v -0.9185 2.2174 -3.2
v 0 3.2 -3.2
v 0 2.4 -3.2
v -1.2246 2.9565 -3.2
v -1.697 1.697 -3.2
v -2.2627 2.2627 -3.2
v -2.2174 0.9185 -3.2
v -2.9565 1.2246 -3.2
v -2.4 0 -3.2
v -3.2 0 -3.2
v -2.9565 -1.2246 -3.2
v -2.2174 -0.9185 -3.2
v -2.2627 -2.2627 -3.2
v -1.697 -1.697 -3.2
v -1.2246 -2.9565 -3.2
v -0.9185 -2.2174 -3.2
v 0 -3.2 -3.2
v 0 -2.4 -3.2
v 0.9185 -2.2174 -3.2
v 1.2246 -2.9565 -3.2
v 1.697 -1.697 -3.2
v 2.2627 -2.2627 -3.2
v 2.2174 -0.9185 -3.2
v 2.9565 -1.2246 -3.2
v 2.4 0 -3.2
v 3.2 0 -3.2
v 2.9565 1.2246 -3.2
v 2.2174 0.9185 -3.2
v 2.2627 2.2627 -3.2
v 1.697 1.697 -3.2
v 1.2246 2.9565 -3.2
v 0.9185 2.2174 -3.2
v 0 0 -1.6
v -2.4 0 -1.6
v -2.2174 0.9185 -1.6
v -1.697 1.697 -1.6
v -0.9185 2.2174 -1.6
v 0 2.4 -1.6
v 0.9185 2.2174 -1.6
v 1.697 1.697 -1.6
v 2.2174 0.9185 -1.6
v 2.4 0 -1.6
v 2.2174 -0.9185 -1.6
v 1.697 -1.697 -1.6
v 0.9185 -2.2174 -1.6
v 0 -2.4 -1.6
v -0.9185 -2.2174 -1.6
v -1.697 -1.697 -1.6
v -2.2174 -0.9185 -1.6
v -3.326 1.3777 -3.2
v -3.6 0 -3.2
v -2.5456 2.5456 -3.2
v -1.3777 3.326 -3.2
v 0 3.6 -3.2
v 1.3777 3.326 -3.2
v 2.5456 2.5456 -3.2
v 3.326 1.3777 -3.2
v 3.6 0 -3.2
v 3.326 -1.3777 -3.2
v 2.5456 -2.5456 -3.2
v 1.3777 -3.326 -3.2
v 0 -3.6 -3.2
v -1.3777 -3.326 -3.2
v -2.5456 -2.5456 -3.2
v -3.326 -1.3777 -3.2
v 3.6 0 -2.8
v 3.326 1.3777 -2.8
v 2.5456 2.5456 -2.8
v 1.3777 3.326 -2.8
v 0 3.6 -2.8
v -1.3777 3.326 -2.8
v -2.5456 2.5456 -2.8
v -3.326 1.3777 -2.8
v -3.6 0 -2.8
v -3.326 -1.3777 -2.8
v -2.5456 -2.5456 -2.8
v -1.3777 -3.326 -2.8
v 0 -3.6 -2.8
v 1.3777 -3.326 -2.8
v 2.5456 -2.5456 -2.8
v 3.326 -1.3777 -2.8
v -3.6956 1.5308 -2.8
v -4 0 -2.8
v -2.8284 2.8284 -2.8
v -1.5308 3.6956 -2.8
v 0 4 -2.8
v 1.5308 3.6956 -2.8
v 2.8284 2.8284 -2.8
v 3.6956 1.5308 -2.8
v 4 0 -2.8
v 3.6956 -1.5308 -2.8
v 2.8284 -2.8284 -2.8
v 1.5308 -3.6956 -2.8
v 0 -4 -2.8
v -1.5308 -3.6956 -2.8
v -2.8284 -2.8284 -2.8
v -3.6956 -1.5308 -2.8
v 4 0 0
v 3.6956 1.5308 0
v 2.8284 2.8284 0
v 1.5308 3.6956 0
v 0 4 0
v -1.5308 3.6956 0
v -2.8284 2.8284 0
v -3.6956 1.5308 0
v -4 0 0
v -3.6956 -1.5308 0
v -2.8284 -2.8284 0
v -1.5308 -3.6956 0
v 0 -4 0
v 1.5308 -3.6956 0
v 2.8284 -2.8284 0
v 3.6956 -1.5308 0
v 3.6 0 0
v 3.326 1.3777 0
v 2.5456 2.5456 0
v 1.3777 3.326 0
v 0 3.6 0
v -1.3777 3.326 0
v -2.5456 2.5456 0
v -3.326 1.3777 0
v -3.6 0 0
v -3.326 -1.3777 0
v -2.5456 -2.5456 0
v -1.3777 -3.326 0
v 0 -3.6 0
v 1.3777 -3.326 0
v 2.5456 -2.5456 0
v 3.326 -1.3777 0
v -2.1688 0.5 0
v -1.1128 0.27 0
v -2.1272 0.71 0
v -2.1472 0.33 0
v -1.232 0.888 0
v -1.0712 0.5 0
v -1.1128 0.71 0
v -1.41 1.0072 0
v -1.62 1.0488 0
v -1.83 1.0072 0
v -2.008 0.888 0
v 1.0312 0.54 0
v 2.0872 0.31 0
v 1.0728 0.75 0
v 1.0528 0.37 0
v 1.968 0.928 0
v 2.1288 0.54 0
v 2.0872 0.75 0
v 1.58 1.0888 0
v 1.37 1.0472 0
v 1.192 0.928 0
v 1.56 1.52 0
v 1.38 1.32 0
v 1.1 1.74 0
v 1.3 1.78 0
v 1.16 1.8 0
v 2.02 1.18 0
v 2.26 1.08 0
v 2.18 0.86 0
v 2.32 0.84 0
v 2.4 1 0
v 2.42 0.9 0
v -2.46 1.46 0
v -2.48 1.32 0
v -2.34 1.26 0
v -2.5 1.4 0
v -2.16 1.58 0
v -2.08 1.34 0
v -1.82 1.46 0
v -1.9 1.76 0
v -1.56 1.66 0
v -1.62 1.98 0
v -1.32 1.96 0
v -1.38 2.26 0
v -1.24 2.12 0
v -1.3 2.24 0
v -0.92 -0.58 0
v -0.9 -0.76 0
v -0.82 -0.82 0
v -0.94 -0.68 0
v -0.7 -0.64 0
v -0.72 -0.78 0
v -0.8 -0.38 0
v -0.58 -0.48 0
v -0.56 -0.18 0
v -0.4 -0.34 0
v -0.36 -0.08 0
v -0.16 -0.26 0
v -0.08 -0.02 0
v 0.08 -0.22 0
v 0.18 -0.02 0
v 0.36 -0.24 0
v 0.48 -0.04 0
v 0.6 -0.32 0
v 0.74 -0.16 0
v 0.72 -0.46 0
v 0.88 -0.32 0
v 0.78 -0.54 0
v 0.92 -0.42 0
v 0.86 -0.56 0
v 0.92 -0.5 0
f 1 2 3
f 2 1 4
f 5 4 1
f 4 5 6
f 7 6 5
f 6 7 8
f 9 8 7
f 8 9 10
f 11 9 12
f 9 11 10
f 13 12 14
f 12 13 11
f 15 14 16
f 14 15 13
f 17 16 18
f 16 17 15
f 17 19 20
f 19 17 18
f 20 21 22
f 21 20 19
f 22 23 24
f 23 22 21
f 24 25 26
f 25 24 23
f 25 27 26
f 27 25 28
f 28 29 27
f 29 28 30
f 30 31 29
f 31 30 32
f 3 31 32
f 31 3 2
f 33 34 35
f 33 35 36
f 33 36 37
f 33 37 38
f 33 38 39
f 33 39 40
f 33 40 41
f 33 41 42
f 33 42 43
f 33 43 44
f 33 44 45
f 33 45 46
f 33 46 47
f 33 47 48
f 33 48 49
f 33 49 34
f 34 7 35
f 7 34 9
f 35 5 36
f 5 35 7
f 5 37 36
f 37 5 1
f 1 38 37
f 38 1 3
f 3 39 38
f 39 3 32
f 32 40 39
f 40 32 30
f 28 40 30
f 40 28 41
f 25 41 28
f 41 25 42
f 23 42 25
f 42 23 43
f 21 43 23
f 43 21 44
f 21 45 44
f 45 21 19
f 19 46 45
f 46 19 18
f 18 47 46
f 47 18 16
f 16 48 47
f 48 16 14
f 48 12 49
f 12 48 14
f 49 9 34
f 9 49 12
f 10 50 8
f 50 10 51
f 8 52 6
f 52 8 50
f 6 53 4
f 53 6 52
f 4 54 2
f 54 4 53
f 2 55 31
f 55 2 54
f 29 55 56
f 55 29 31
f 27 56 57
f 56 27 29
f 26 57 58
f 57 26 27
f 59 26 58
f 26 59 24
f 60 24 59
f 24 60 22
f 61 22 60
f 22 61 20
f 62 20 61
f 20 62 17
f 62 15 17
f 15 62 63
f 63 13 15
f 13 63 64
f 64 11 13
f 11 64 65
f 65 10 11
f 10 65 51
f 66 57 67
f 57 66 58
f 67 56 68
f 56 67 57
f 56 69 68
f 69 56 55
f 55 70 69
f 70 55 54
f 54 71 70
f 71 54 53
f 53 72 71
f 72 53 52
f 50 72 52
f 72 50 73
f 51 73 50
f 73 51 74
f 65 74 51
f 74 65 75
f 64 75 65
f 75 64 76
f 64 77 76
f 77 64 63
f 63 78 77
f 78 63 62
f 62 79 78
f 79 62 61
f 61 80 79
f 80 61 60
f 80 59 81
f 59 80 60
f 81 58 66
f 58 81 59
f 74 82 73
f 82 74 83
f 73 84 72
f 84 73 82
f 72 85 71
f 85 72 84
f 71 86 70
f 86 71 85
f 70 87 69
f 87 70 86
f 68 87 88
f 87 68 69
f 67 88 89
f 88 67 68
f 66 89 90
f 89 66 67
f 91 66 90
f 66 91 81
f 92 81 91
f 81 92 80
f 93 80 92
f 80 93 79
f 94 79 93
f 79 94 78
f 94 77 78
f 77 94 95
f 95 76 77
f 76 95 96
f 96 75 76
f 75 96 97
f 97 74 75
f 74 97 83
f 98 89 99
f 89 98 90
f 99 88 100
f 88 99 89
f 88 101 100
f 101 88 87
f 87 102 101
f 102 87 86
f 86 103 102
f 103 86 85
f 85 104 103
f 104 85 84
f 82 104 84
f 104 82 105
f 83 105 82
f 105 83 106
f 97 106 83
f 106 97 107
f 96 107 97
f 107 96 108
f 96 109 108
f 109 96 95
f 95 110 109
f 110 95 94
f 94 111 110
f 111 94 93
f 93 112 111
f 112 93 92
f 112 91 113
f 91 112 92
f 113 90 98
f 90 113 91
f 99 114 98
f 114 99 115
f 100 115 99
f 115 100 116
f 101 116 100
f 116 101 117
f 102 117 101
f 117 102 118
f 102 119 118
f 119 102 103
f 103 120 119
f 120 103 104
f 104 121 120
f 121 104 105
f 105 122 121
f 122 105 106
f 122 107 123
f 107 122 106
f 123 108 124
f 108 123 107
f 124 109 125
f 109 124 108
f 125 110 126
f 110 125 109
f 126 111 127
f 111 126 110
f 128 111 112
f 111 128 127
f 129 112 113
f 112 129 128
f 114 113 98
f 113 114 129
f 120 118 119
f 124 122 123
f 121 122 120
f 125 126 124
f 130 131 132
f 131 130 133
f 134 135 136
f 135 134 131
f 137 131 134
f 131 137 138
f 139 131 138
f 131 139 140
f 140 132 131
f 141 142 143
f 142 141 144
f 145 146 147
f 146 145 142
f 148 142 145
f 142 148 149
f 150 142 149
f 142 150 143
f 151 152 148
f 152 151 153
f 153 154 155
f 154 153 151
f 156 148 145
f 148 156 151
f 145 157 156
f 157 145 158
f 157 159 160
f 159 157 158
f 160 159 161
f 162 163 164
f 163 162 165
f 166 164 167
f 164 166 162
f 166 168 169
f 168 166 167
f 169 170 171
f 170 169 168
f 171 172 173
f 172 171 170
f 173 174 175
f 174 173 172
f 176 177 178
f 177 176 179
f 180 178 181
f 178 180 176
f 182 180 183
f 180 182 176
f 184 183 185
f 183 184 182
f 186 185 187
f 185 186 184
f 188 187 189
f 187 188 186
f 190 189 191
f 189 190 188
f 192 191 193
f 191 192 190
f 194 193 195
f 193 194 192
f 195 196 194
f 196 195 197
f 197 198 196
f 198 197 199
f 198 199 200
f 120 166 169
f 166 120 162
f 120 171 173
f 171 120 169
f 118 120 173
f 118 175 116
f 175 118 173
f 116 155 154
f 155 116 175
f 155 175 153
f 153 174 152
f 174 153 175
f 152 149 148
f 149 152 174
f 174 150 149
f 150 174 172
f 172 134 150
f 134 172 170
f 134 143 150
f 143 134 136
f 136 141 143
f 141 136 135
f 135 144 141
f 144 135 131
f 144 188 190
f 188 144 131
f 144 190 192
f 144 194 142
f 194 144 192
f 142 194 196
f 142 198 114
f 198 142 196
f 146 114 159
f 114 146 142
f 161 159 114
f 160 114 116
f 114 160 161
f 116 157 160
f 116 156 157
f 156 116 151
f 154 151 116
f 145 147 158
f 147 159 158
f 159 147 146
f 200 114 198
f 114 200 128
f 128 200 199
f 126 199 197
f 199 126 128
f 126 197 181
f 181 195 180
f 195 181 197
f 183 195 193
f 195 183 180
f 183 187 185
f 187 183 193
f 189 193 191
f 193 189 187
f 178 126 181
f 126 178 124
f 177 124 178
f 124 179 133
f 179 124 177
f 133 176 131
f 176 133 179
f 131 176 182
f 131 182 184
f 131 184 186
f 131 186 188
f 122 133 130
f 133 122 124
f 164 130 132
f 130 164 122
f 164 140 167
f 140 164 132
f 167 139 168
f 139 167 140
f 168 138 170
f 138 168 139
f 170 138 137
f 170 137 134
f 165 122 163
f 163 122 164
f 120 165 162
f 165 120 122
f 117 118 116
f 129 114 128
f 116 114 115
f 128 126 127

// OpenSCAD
// file: ../p/4-4disc.scad
use <../lib.scad>
function ldraw_lib__4_4disc() = [
// 0 Disc 1.0
// 0 Name: 4-4disc.dat
// 0 Author: James Jessiman
// 0 !LDRAW_ORG Primitive UPDATE 2002-02
// 0 !LICENSE Licensed under CC BY 2.0 and CC BY 4.0 : see CAreadme.txt
// 
// 0 BFC CERTIFY CCW
  [0,"BFC","CERTIFY"],
  [0,"BFC","CCW"],
// 
// 0 !HISTORY 1998-12-15 [PTadmin] Official Update 1998-10
// 0 !HISTORY 2002-03-23 [sbliss] Added BFC statement
// 0 !HISTORY 2002-04-25 [PTadmin] Official Update 2002-02
// 0 !HISTORY 2007-06-24 [PTadmin] Header formatted for Contributor Agreement
// 0 !HISTORY 2008-07-01 [PTadmin] Official Update 2008-01
// 
// 
// 3 16 0 0 0 1 0 0 0.9239 0 0.3827
  [3,16,0,0,0,1,0,0,0.9239,0,0.3827],
// 3 16 0 0 0 0.9239 0 0.3827 0.7071 0 0.7071
  [3,16,0,0,0,0.9239,0,0.3827,0.7071,0,0.7071],
// 3 16 0 0 0 0.7071 0 0.7071 0.3827 0 0.9239
  [3,16,0,0,0,0.7071,0,0.7071,0.3827,0,0.9239],
// 3 16 0 0 0 0.3827 0 0.9239 0 0 1
  [3,16,0,0,0,0.3827,0,0.9239,0,0,1],
// 3 16 0 0 0 0 0 1 -0.3827 0 0.9239
  [3,16,0,0,0,0,0,1,-0.3827,0,0.9239],
// 3 16 0 0 0 -0.3827 0 0.9239 -0.7071 0 0.7071
  [3,16,0,0,0,-0.3827,0,0.9239,-0.7071,0,0.7071],
// 3 16 0 0 0 -0.7071 0 0.7071 -0.9239 0 0.3827
  [3,16,0,0,0,-0.7071,0,0.7071,-0.9239,0,0.3827],
// 3 16 0 0 0 -0.9239 0 0.3827 -1 0 -0
  [3,16,0,0,0,-0.9239,0,0.3827,-1,0,-0],
// 3 16 0 0 0 -1 0 -0 -0.9239 0 -0.3827
  [3,16,0,0,0,-1,0,-0,-0.9239,0,-0.3827],
// 3 16 0 0 0 -0.9239 0 -0.3827 -0.7071 0 -0.7071
  [3,16,0,0,0,-0.9239,0,-0.3827,-0.7071,0,-0.7071],
// 3 16 0 0 0 -0.7071 0 -0.7071 -0.3827 0 -0.9239
  [3,16,0,0,0,-0.7071,0,-0.7071,-0.3827,0,-0.9239],
// 3 16 0 0 0 -0.3827 0 -0.9239 0 0 -1
  [3,16,0,0,0,-0.3827,0,-0.9239,0,0,-1],
// 3 16 0 0 0 0 0 -1 0.3827 0 -0.9239
  [3,16,0,0,0,0,0,-1,0.3827,0,-0.9239],
// 3 16 0 0 0 0.3827 0 -0.9239 0.7071 0 -0.7071
  [3,16,0,0,0,0.3827,0,-0.9239,0.7071,0,-0.7071],
// 3 16 0 0 0 0.7071 0 -0.7071 0.9239 0 -0.3827
  [3,16,0,0,0,0.7071,0,-0.7071,0.9239,0,-0.3827],
// 3 16 0 0 0 0.9239 0 -0.3827 1 0 0
  [3,16,0,0,0,0.9239,0,-0.3827,1,0,0],
// 0
];
module ldraw_lib__4_4disc(step=0, col=false, unit=2/5, alt=false, line=0.2, solid=!$preview)
    makepoly(ldraw_lib__4_4disc(), step=step, col=col, unit=unit, alt=alt, line=line, solid=solid);
ldraw_lib__4_4disc(line=0.2);
// file: ../p/4-4ring3.scad
use <../lib.scad>
function ldraw_lib__4_4ring3() = [
// 0 Ring  3 x 1.0
// 0 Name: 4-4ring3.dat
// 0 Author: James Jessiman
// 0 !LDRAW_ORG Primitive UPDATE 2009-01
// 0 !LICENSE Licensed under CC BY 2.0 and CC BY 4.0 : see CAreadme.txt
// 
// 0 BFC CERTIFY CCW
  [0,"BFC","CERTIFY"],
  [0,"BFC","CCW"],
// 
// 0 !HISTORY 1998-12-15 [PTadmin] Official Update 1998-10
// 0 !HISTORY 2002-04-05 [hafhead] Added BFC statement
// 0 !HISTORY 2002-04-25 [PTadmin] Official Update 2002-02
// 0 !HISTORY 2007-06-24 [PTadmin] Header formatted for Contributor Agreement
// 0 !HISTORY 2008-07-01 [PTadmin] Official Update 2008-01
// 0 !HISTORY 2008-08-26 [cwdee] Switch polygon winding and rename
// 0 !HISTORY 2009-05-02 [PTadmin] Official Update 2009-01
// 
// 
// 4 16 -1.5308 0 3.6956 -1.1481 0 2.7717 0 0 3 0 0 4
  [4,16,-1.5308,0,3.6956,-1.1481,0,2.7717,0,0,3,0,0,4],
// 4 16 -2.8284 0 2.8284 -2.1213 0 2.1213 -1.1481 0 2.7717 -1.5308 0 3.6956
  [4,16,-2.8284,0,2.8284,-2.1213,0,2.1213,-1.1481,0,2.7717,-1.5308,0,3.6956],
// 4 16 -3.6956 0 1.5308 -2.7717 0 1.1481 -2.1213 0 2.1213 -2.8284 0 2.8284
  [4,16,-3.6956,0,1.5308,-2.7717,0,1.1481,-2.1213,0,2.1213,-2.8284,0,2.8284],
// 4 16 -4 0 0 -3 0 0 -2.7717 0 1.1481 -3.6956 0 1.5308
  [4,16,-4,0,0,-3,0,0,-2.7717,0,1.1481,-3.6956,0,1.5308],
// 4 16 -3.6956 0 -1.5308 -2.7717 0 -1.1481 -3 0 0 -4 0 0
  [4,16,-3.6956,0,-1.5308,-2.7717,0,-1.1481,-3,0,0,-4,0,0],
// 4 16 -2.8284 0 -2.8284 -2.1213 0 -2.1213 -2.7717 0 -1.1481 -3.6956 0 -1.5308
  [4,16,-2.8284,0,-2.8284,-2.1213,0,-2.1213,-2.7717,0,-1.1481,-3.6956,0,-1.5308],
// 4 16 -1.5308 0 -3.6956 -1.1481 0 -2.7717 -2.1213 0 -2.1213 -2.8284 0 -2.8284
  [4,16,-1.5308,0,-3.6956,-1.1481,0,-2.7717,-2.1213,0,-2.1213,-2.8284,0,-2.8284],
// 4 16 0 0 -4 0 0 -3 -1.1481 0 -2.7717 -1.5308 0 -3.6956
  [4,16,0,0,-4,0,0,-3,-1.1481,0,-2.7717,-1.5308,0,-3.6956],
// 4 16 1.5308 0 -3.6956 1.1481 0 -2.7717 0 0 -3 0 0 -4
  [4,16,1.5308,0,-3.6956,1.1481,0,-2.7717,0,0,-3,0,0,-4],
// 4 16 2.8284 0 -2.8284 2.1213 0 -2.1213 1.1481 0 -2.7717 1.5308 0 -3.6956
  [4,16,2.8284,0,-2.8284,2.1213,0,-2.1213,1.1481,0,-2.7717,1.5308,0,-3.6956],
// 4 16 3.6956 0 -1.5308 2.7717 0 -1.1481 2.1213 0 -2.1213 2.8284 0 -2.8284
  [4,16,3.6956,0,-1.5308,2.7717,0,-1.1481,2.1213,0,-2.1213,2.8284,0,-2.8284],
// 4 16 4 0 0 3 0 0 2.7717 0 -1.1481 3.6956 0 -1.5308
  [4,16,4,0,0,3,0,0,2.7717,0,-1.1481,3.6956,0,-1.5308],
// 4 16 3.6956 0 1.5308 2.7717 0 1.1481 3 0 0 4 0 0
  [4,16,3.6956,0,1.5308,2.7717,0,1.1481,3,0,0,4,0,0],
// 4 16 2.8284 0 2.8284 2.1213 0 2.1213 2.7717 0 1.1481 3.6956 0 1.5308
  [4,16,2.8284,0,2.8284,2.1213,0,2.1213,2.7717,0,1.1481,3.6956,0,1.5308],
// 4 16 1.5308 0 3.6956 1.1481 0 2.7717 2.1213 0 2.1213 2.8284 0 2.8284
  [4,16,1.5308,0,3.6956,1.1481,0,2.7717,2.1213,0,2.1213,2.8284,0,2.8284],
// 4 16 0 0 4 0 0 3 1.1481 0 2.7717 1.5308 0 3.6956
  [4,16,0,0,4,0,0,3,1.1481,0,2.7717,1.5308,0,3.6956],
// 0
];
module ldraw_lib__4_4ring3(step=0, col=false, unit=2/5, alt=false, line=0.2, solid=!$preview)
    makepoly(ldraw_lib__4_4ring3(), step=step, col=col, unit=unit, alt=alt, line=line, solid=solid);
ldraw_lib__4_4ring3(line=0.2);
// file: ../p/4-4cylc.scad
use <../lib.scad>
use <4-4cyli.scad>
use <4-4disc.scad>
use <4-4edge.scad>
function ldraw_lib__4_4cylc() = [
// 0 Cylinder Closed 1.0
// 0 Name: 4-4cylc.dat
// 0 Author: Alex Taylor [anathema]
// 0 !LDRAW_ORG Primitive UPDATE 2009-02
// 0 !LICENSE Licensed under CC BY 2.0 and CC BY 4.0 : see CAreadme.txt
// 
// 0 BFC CERTIFY CCW
  [0,"BFC","CERTIFY"],
  [0,"BFC","CCW"],
// 
// 0 !HISTORY 2008-12-29 [cwdee] Removed one disc
// 0 !HISTORY 2009-09-03 [PTadmin] Official Update 2009-02
// 
// 
// 1 16 0 0 0 1 0 0 0 1 0 0 0 1 4-4edge.dat
  [1,16,0,0,0,1,0,0,0,1,0,0,0,1, ldraw_lib__4_4edge()],
// 1 16 0 1 0 1 0 0 0 1 0 0 0 1 4-4edge.dat
  [1,16,0,1,0,1,0,0,0,1,0,0,0,1, ldraw_lib__4_4edge()],
// 1 16 0 0 0 1 0 0 0 1 0 0 0 1 4-4disc.dat
  [1,16,0,0,0,1,0,0,0,1,0,0,0,1, ldraw_lib__4_4disc()],
// 1 16 0 0 0 1 0 0 0 1 0 0 0 1 4-4cyli.dat
  [1,16,0,0,0,1,0,0,0,1,0,0,0,1, ldraw_lib__4_4cyli()],
// 0
];
module ldraw_lib__4_4cylc(step=0, col=false, unit=2/5, alt=false, line=0.2, solid=!$preview)
    makepoly(ldraw_lib__4_4cylc(), step=step, col=col, unit=unit, alt=alt, line=line, solid=solid);
ldraw_lib__4_4cylc(line=0.2);
// file: ../p/4-4edge.scad
use <../lib.scad>
function ldraw_lib__4_4edge() = [
// 0 Circle 1.0
// 0 Name: 4-4edge.dat
// 0 Author: James Jessiman
// 0 !LDRAW_ORG Primitive UPDATE 2017-01
// 0 !LICENSE Licensed under CC BY 2.0 and CC BY 4.0 : see CAreadme.txt
// 
// 0 BFC CERTIFY CCW
  [0,"BFC","CERTIFY"],
  [0,"BFC","CCW"],
// 
// 0 !HISTORY 1998-12-15 [PTadmin] Official Update 1998-10
// 0 !HISTORY 2005-12-28 [PTadmin] Official Update 2005-01
// 0 !HISTORY 2007-06-24 [PTadmin] Header formatted for Contributor Agreement
// 0 !HISTORY 2008-07-01 [PTadmin] Official Update 2008-01
// 0 !HISTORY 2017-01-15 [Steffen] BFCed
// 0 !HISTORY 2017-12-30 [PTadmin] Official Update 2017-01
// 
// 
// 2 24 1 0 0 0.9239 0 0.3827
  [2,24,1,0,0,0.9239,0,0.3827],
// 2 24 0.9239 0 0.3827 0.7071 0 0.7071
  [2,24,0.9239,0,0.3827,0.7071,0,0.7071],
// 2 24 0.7071 0 0.7071 0.3827 0 0.9239
  [2,24,0.7071,0,0.7071,0.3827,0,0.9239],
// 2 24 0.3827 0 0.9239 0 0 1
  [2,24,0.3827,0,0.9239,0,0,1],
// 2 24 0 0 1 -0.3827 0 0.9239
  [2,24,0,0,1,-0.3827,0,0.9239],
// 2 24 -0.3827 0 0.9239 -0.7071 0 0.7071
  [2,24,-0.3827,0,0.9239,-0.7071,0,0.7071],
// 2 24 -0.7071 0 0.7071 -0.9239 0 0.3827
  [2,24,-0.7071,0,0.7071,-0.9239,0,0.3827],
// 2 24 -0.9239 0 0.3827 -1 0 -0
  [2,24,-0.9239,0,0.3827,-1,0,-0],
// 2 24 -1 0 -0 -0.9239 0 -0.3827
  [2,24,-1,0,-0,-0.9239,0,-0.3827],
// 2 24 -0.9239 0 -0.3827 -0.7071 0 -0.7071
  [2,24,-0.9239,0,-0.3827,-0.7071,0,-0.7071],
// 2 24 -0.7071 0 -0.7071 -0.3827 0 -0.9239
  [2,24,-0.7071,0,-0.7071,-0.3827,0,-0.9239],
// 2 24 -0.3827 0 -0.9239 0 0 -1
  [2,24,-0.3827,0,-0.9239,0,0,-1],
// 2 24 0 0 -1 0.3827 0 -0.9239
  [2,24,0,0,-1,0.3827,0,-0.9239],
// 2 24 0.3827 0 -0.9239 0.7071 0 -0.7071
  [2,24,0.3827,0,-0.9239,0.7071,0,-0.7071],
// 2 24 0.7071 0 -0.7071 0.9239 0 -0.3827
  [2,24,0.7071,0,-0.7071,0.9239,0,-0.3827],
// 2 24 0.9239 0 -0.3827 1 0 0
  [2,24,0.9239,0,-0.3827,1,0,0],
];
module ldraw_lib__4_4edge(step=0, col=false, unit=2/5, alt=false, line=0.2, solid=!$preview)
    makepoly(ldraw_lib__4_4edge(), step=step, col=col, unit=unit, alt=alt, line=line, solid=solid);
ldraw_lib__4_4edge(line=0.2);
// file: ../p/4-4cyli.scad
use <../lib.scad>
function ldraw_lib__4_4cyli() = [
// 0 Cylinder 1.0
// 0 Name: 4-4cyli.dat
// 0 Author: James Jessiman
// 0 !LDRAW_ORG Primitive UPDATE 2005-01
// 0 !LICENSE Licensed under CC BY 2.0 and CC BY 4.0 : see CAreadme.txt
// 
// 0 BFC CERTIFY CCW
  [0,"BFC","CERTIFY"],
  [0,"BFC","CCW"],
// 
// 0 !HISTORY 1998-12-15 [PTadmin] Official Update 1998-10
// 0 !HISTORY 2002-03-23 [sbliss] Added BFC statement; merged headers from files in distributions LDraw 0.27 and Complete.
// 0 !HISTORY 2002-04-25 [PTadmin] Official Update 2002-02
// 0 !HISTORY 2004-12-14 [guyvivan] BFC CCW
// 0 !HISTORY 2005-12-28 [PTadmin] Official Update 2005-01
// 0 !HISTORY 2007-06-24 [PTadmin] Header formatted for Contributor Agreement
// 0 !HISTORY 2008-07-01 [PTadmin] Official Update 2008-01
// 
// 
// 4 16 1 1 0 0.9239 1 0.3827 0.9239 0 0.3827 1 0 0
  [4,16,1,1,0,0.9239,1,0.3827,0.9239,0,0.3827,1,0,0],
// 5 24 1 0 0 1 1 0 0.9239 0 0.3827 0.9239 0 -0.3827
  [5,24,1,0,0,1,1,0,0.9239,0,0.3827,0.9239,0,-0.3827],
// 4 16 0.9239 1 0.3827 0.7071 1 0.7071 0.7071 0 0.7071 0.9239 0 0.3827
  [4,16,0.9239,1,0.3827,0.7071,1,0.7071,0.7071,0,0.7071,0.9239,0,0.3827],
// 5 24 0.9239 0 0.3827 0.9239 1 0.3827 0.7071 0 0.7071 1 0 0
  [5,24,0.9239,0,0.3827,0.9239,1,0.3827,0.7071,0,0.7071,1,0,0],
// 4 16 0.7071 1 0.7071 0.3827 1 0.9239 0.3827 0 0.9239 0.7071 0 0.7071
  [4,16,0.7071,1,0.7071,0.3827,1,0.9239,0.3827,0,0.9239,0.7071,0,0.7071],
// 5 24 0.7071 0 0.7071 0.7071 1 0.7071 0.3827 0 0.9239 0.9239 0 0.3827
  [5,24,0.7071,0,0.7071,0.7071,1,0.7071,0.3827,0,0.9239,0.9239,0,0.3827],
// 4 16 0.3827 1 0.9239 0 1 1 0 0 1 0.3827 0 0.9239
  [4,16,0.3827,1,0.9239,0,1,1,0,0,1,0.3827,0,0.9239],
// 5 24 0.3827 0 0.9239 0.3827 1 0.9239 0 0 1 0.7071 0 0.7071
  [5,24,0.3827,0,0.9239,0.3827,1,0.9239,0,0,1,0.7071,0,0.7071],
// 4 16 0 1 1 -0.3827 1 0.9239 -0.3827 0 0.9239 0 0 1
  [4,16,0,1,1,-0.3827,1,0.9239,-0.3827,0,0.9239,0,0,1],
// 5 24 0 0 1 0 1 1 -0.3827 0 0.9239 0.3827 0 0.9239
  [5,24,0,0,1,0,1,1,-0.3827,0,0.9239,0.3827,0,0.9239],
// 4 16 -0.3827 1 0.9239 -0.7071 1 0.7071 -0.7071 0 0.7071 -0.3827 0 0.9239
  [4,16,-0.3827,1,0.9239,-0.7071,1,0.7071,-0.7071,0,0.7071,-0.3827,0,0.9239],
// 5 24 -0.3827 0 0.9239 -0.3827 1 0.9239 -0.7071 0 0.7071 0 0 1
  [5,24,-0.3827,0,0.9239,-0.3827,1,0.9239,-0.7071,0,0.7071,0,0,1],
// 4 16 -0.7071 1 0.7071 -0.9239 1 0.3827 -0.9239 0 0.3827 -0.7071 0 0.7071
  [4,16,-0.7071,1,0.7071,-0.9239,1,0.3827,-0.9239,0,0.3827,-0.7071,0,0.7071],
// 5 24 -0.7071 0 0.7071 -0.7071 1 0.7071 -0.9239 0 0.3827 -0.3827 0 0.9239
  [5,24,-0.7071,0,0.7071,-0.7071,1,0.7071,-0.9239,0,0.3827,-0.3827,0,0.9239],
// 4 16 -0.9239 1 0.3827 -1 1 0 -1 0 0 -0.9239 0 0.3827
  [4,16,-0.9239,1,0.3827,-1,1,0,-1,0,0,-0.9239,0,0.3827],
// 5 24 -0.9239 0 0.3827 -0.9239 1 0.3827 -1 0 0 -0.7071 0 0.7071
  [5,24,-0.9239,0,0.3827,-0.9239,1,0.3827,-1,0,0,-0.7071,0,0.7071],
// 4 16 -1 1 0 -0.9239 1 -0.3827 -0.9239 0 -0.3827 -1 0 0
  [4,16,-1,1,0,-0.9239,1,-0.3827,-0.9239,0,-0.3827,-1,0,0],
// 5 24 -1 0 0 -1 1 0 -0.9239 0 -0.3827 -0.9239 0 0.3827
  [5,24,-1,0,0,-1,1,0,-0.9239,0,-0.3827,-0.9239,0,0.3827],
// 4 16 -0.9239 1 -0.3827 -0.7071 1 -0.7071 -0.7071 0 -0.7071 -0.9239 0 -0.3827
  [4,16,-0.9239,1,-0.3827,-0.7071,1,-0.7071,-0.7071,0,-0.7071,-0.9239,0,-0.3827],
// 5 24 -0.9239 0 -0.3827 -0.9239 1 -0.3827 -0.7071 0 -0.7071 -1 0 0
  [5,24,-0.9239,0,-0.3827,-0.9239,1,-0.3827,-0.7071,0,-0.7071,-1,0,0],
// 4 16 -0.7071 1 -0.7071 -0.3827 1 -0.9239 -0.3827 0 -0.9239 -0.7071 0 -0.7071
  [4,16,-0.7071,1,-0.7071,-0.3827,1,-0.9239,-0.3827,0,-0.9239,-0.7071,0,-0.7071],
// 5 24 -0.7071 0 -0.7071 -0.7071 1 -0.7071 -0.3827 0 -0.9239 -0.9239 0 -0.3827
  [5,24,-0.7071,0,-0.7071,-0.7071,1,-0.7071,-0.3827,0,-0.9239,-0.9239,0,-0.3827],
// 4 16 -0.3827 1 -0.9239 0 1 -1 0 0 -1 -0.3827 0 -0.9239
  [4,16,-0.3827,1,-0.9239,0,1,-1,0,0,-1,-0.3827,0,-0.9239],
// 5 24 -0.3827 0 -0.9239 -0.3827 1 -0.9239 0 0 -1 -0.7071 0 -0.7071
  [5,24,-0.3827,0,-0.9239,-0.3827,1,-0.9239,0,0,-1,-0.7071,0,-0.7071],
// 4 16 0 1 -1 0.3827 1 -0.9239 0.3827 0 -0.9239 0 0 -1
  [4,16,0,1,-1,0.3827,1,-0.9239,0.3827,0,-0.9239,0,0,-1],
// 5 24 0 0 -1 0 1 -1 0.3827 0 -0.9239 -0.3827 0 -0.9239
  [5,24,0,0,-1,0,1,-1,0.3827,0,-0.9239,-0.3827,0,-0.9239],
// 4 16 0.3827 1 -0.9239 0.7071 1 -0.7071 0.7071 0 -0.7071 0.3827 0 -0.9239
  [4,16,0.3827,1,-0.9239,0.7071,1,-0.7071,0.7071,0,-0.7071,0.3827,0,-0.9239],
// 5 24 0.3827 0 -0.9239 0.3827 1 -0.9239 0.7071 0 -0.7071 0 0 -1
  [5,24,0.3827,0,-0.9239,0.3827,1,-0.9239,0.7071,0,-0.7071,0,0,-1],
// 4 16 0.7071 1 -0.7071 0.9239 1 -0.3827 0.9239 0 -0.3827 0.7071 0 -0.7071
  [4,16,0.7071,1,-0.7071,0.9239,1,-0.3827,0.9239,0,-0.3827,0.7071,0,-0.7071],
// 5 24 0.7071 0 -0.7071 0.7071 1 -0.7071 0.9239 0 -0.3827 0.3827 0 -0.9239
  [5,24,0.7071,0,-0.7071,0.7071,1,-0.7071,0.9239,0,-0.3827,0.3827,0,-0.9239],
// 4 16 0.9239 1 -0.3827 1 1 0 1 0 0 0.9239 0 -0.3827
  [4,16,0.9239,1,-0.3827,1,1,0,1,0,0,0.9239,0,-0.3827],
// 5 24 0.9239 0 -0.3827 0.9239 1 -0.3827 1 0 0 0.7071 0 -0.7071
  [5,24,0.9239,0,-0.3827,0.9239,1,-0.3827,1,0,0,0.7071,0,-0.7071],
// 0
];
module ldraw_lib__4_4cyli(step=0, col=false, unit=2/5, alt=false, line=0.2, solid=!$preview)
    makepoly(ldraw_lib__4_4cyli(), step=step, col=col, unit=unit, alt=alt, line=line, solid=solid);
ldraw_lib__4_4cyli(line=0.2);
// file: ../p/stud4o.scad
use <../lib.scad>
use <4-4cylc.scad>
use <4-4ring3.scad>
function ldraw_lib__stud4o() = [
// 0 Stud Tube Open without Outer Cylinder
// 0 Name: stud4o.dat
// 0 Author: Magnus Forsberg [MagFors]
// 0 !LDRAW_ORG Primitive UPDATE 2011-02
// 0 !LICENSE Licensed under CC BY 2.0 and CC BY 4.0 : see CAreadme.txt
// 
// 0 !HELP This stud is a "antistud" to be used like a underside stud,
// 0 !HELP but without the outer cylinder.
// 0 !HELP 1 47 0 0 0 1 0 0 0 1 0 0 0 1 stud4.dat
// 
// 0 BFC CERTIFY CCW
  [0,"BFC","CERTIFY"],
  [0,"BFC","CCW"],
// 
// 0 !HISTORY 2011-12-29 [PTadmin] Official Update 2011-02
// 
// 
// 1 16 0 -4 0 2 0 0 0 1 0 0 0 2 4-4ring3.dat
  [1,16,0,-4,0,2,0,0,0,1,0,0,0,2, ldraw_lib__4_4ring3()],
// 0 BFC INVERTNEXT
  [0,"BFC","INVERTNEXT"],
// 1 16 0 0 0 -6 0 0 0 -4 0 0 0 6 4-4cylc.dat
  [1,16,0,0,0,-6,0,0,0,-4,0,0,0,6, ldraw_lib__4_4cylc()],
];
module ldraw_lib__stud4o(step=0, col=false, unit=2/5, alt=false, line=0.2, solid=!$preview)
    makepoly(ldraw_lib__stud4o(), step=step, col=col, unit=unit, alt=alt, line=line, solid=solid);
ldraw_lib__stud4o(line=0.2);
// file: ../p/4-4ring8.scad
use <../lib.scad>
function ldraw_lib__4_4ring8() = [
// 0 Ring  8 x 1.0
// 0 Name: 4-4ring8.dat
// 0 Author: Steffen [Steffen]
// 0 !LDRAW_ORG Primitive UPDATE 2012-01
// 0 !LICENSE Licensed under CC BY 2.0 and CC BY 4.0 : see CAreadme.txt
// 
// 0 BFC CERTIFY CCW
  [0,"BFC","CERTIFY"],
  [0,"BFC","CCW"],
// 
// 0 !HISTORY 2003-12-19 [PTadmin] Official Update 2003-03
// 0 !HISTORY 2007-06-24 [PTadmin] Header formatted for Contributor Agreement
// 0 !HISTORY 2008-07-01 [PTadmin] Official Update 2008-01
// 0 !HISTORY 2012-02-16 [Philo] Changed to CCW
// 0 !HISTORY 2012-03-30 [PTadmin] Official Update 2012-01
// 
// 
// 4 16 9 0 0 8.3151 0 3.4443 7.3912 0 3.0616 8 0 0
  [4,16,9,0,0,8.3151,0,3.4443,7.3912,0,3.0616,8,0,0],
// 4 16 8.3151 0 3.4443 6.3639 0 6.3639 5.6568 0 5.6568 7.3912 0 3.0616
  [4,16,8.3151,0,3.4443,6.3639,0,6.3639,5.6568,0,5.6568,7.3912,0,3.0616],
// 4 16 6.3639 0 6.3639 3.4443 0 8.3151 3.0616 0 7.3912 5.6568 0 5.6568
  [4,16,6.3639,0,6.3639,3.4443,0,8.3151,3.0616,0,7.3912,5.6568,0,5.6568],
// 4 16 3.4443 0 8.3151 0 0 9 0 0 8 3.0616 0 7.3912
  [4,16,3.4443,0,8.3151,0,0,9,0,0,8,3.0616,0,7.3912],
// 4 16 0 0 9 -3.4443 0 8.3151 -3.0616 0 7.3912 0 0 8
  [4,16,0,0,9,-3.4443,0,8.3151,-3.0616,0,7.3912,0,0,8],
// 4 16 -3.4443 0 8.3151 -6.3639 0 6.3639 -5.6568 0 5.6568 -3.0616 0 7.3912
  [4,16,-3.4443,0,8.3151,-6.3639,0,6.3639,-5.6568,0,5.6568,-3.0616,0,7.3912],
// 4 16 -6.3639 0 6.3639 -8.3151 0 3.4443 -7.3912 0 3.0616 -5.6568 0 5.6568
  [4,16,-6.3639,0,6.3639,-8.3151,0,3.4443,-7.3912,0,3.0616,-5.6568,0,5.6568],
// 4 16 -8.3151 0 3.4443 -9 0 0 -8 0 0 -7.3912 0 3.0616
  [4,16,-8.3151,0,3.4443,-9,0,0,-8,0,0,-7.3912,0,3.0616],
// 4 16 -9 0 0 -8.3151 0 -3.4443 -7.3912 0 -3.0616 -8 0 0
  [4,16,-9,0,0,-8.3151,0,-3.4443,-7.3912,0,-3.0616,-8,0,0],
// 4 16 -8.3151 0 -3.4443 -6.3639 0 -6.3639 -5.6568 0 -5.6568 -7.3912 0 -3.0616
  [4,16,-8.3151,0,-3.4443,-6.3639,0,-6.3639,-5.6568,0,-5.6568,-7.3912,0,-3.0616],
// 4 16 -6.3639 0 -6.3639 -3.4443 0 -8.3151 -3.0616 0 -7.3912 -5.6568 0 -5.6568
  [4,16,-6.3639,0,-6.3639,-3.4443,0,-8.3151,-3.0616,0,-7.3912,-5.6568,0,-5.6568],
// 4 16 -3.4443 0 -8.3151 0 0 -9 0 0 -8 -3.0616 0 -7.3912
  [4,16,-3.4443,0,-8.3151,0,0,-9,0,0,-8,-3.0616,0,-7.3912],
// 4 16 0 0 -9 3.4443 0 -8.3151 3.0616 0 -7.3912 0 0 -8
  [4,16,0,0,-9,3.4443,0,-8.3151,3.0616,0,-7.3912,0,0,-8],
// 4 16 3.4443 0 -8.3151 6.3639 0 -6.3639 5.6568 0 -5.6568 3.0616 0 -7.3912
  [4,16,3.4443,0,-8.3151,6.3639,0,-6.3639,5.6568,0,-5.6568,3.0616,0,-7.3912],
// 4 16 6.3639 0 -6.3639 8.3151 0 -3.4443 7.3912 0 -3.0616 5.6568 0 -5.6568
  [4,16,6.3639,0,-6.3639,8.3151,0,-3.4443,7.3912,0,-3.0616,5.6568,0,-5.6568],
// 4 16 8.3151 0 -3.4443 9 0 0 8 0 0 7.3912 0 -3.0616
  [4,16,8.3151,0,-3.4443,9,0,0,8,0,0,7.3912,0,-3.0616],
];
module ldraw_lib__4_4ring8(step=0, col=false, unit=2/5, alt=false, line=0.2, solid=!$preview)
    makepoly(ldraw_lib__4_4ring8(), step=step, col=col, unit=unit, alt=alt, line=line, solid=solid);
ldraw_lib__4_4ring8(line=0.2);
// file: ../p/4-4cylo.scad
use <../lib.scad>
use <4-4cyli.scad>
use <4-4edge.scad>
function ldraw_lib__4_4cylo() = [
// 0 Cylinder Open 1.0
// 0 Name: 4-4cylo.dat
// 0 Author: Mark Kennedy [mkennedy]
// 0 !LDRAW_ORG Primitive UPDATE 2010-01
// 0 !LICENSE Licensed under CC BY 2.0 and CC BY 4.0 : see CAreadme.txt
// 
// 0 BFC CERTIFY CCW
  [0,"BFC","CERTIFY"],
  [0,"BFC","CCW"],
// 
// 0 !HISTORY 2010-04-05 [PTadmin] Official Update 2010-01
// 
// 
// 1 16 0 0 0 1 0 0 0 1 0 0 0 1 4-4edge.dat
  [1,16,0,0,0,1,0,0,0,1,0,0,0,1, ldraw_lib__4_4edge()],
// 1 16 0 1 0 1 0 0 0 1 0 0 0 1 4-4edge.dat
  [1,16,0,1,0,1,0,0,0,1,0,0,0,1, ldraw_lib__4_4edge()],
// 1 16 0 0 0 1 0 0 0 1 0 0 0 1 4-4cyli.dat
  [1,16,0,0,0,1,0,0,0,1,0,0,0,1, ldraw_lib__4_4cyli()],
// 0
];
module ldraw_lib__4_4cylo(step=0, col=false, unit=2/5, alt=false, line=0.2, solid=!$preview)
    makepoly(ldraw_lib__4_4cylo(), step=step, col=col, unit=unit, alt=alt, line=line, solid=solid);
ldraw_lib__4_4cylo(line=0.2);
// file: s/98138s02.scad
use <../../lib.scad>
use <../../p/4-4cylo.scad>
use <../../p/4-4ring8.scad>
use <../../p/4-4ring9.scad>
use <../../p/stud4o.scad>
function ldraw_lib__s__98138s02() = [
// 0 ~Tile  1 x  1 Round with Groove without Complete Top Face
// 0 Name: s\98138s02.dat
// 0 Author: Magnus Forsberg [MagFors]
// 0 !LDRAW_ORG Subpart UPDATE 2020-01
// 0 !LICENSE Licensed under CC BY 2.0 and CC BY 4.0 : see CAreadme.txt
// 
// 0 BFC CERTIFY CCW
  [0,"BFC","CERTIFY"],
  [0,"BFC","CCW"],
// 
// 0 !HISTORY 2020-06-28 [PTadmin] Official Update 2020-01
// 
// 
// 1 16 0 4 0 1 0 0 0 -1 0 0 0 1 stud4o.dat
  [1,16,0,4,0,1,0,0,0,-1,0,0,0,1, ldraw_lib__stud4o()],
// 1 16 0 8 0 -1 0 0 0 -1 0 0 0 1 4-4ring8.dat
  [1,16,0,8,0,-1,0,0,0,-1,0,0,0,1, ldraw_lib__4_4ring8()],
// 1 16 0 7 0 9 0 0 0 1 0 0 0 9 4-4cylo.dat
  [1,16,0,7,0,9,0,0,0,1,0,0,0,9, ldraw_lib__4_4cylo()],
// 1 16 0 7 0 -1 0 0 0 -1 0 0 0 1 4-4ring9.dat
  [1,16,0,7,0,-1,0,0,0,-1,0,0,0,1, ldraw_lib__4_4ring9()],
// 1 16 0 0 0 10 0 0 0 7 0 0 0 10 4-4cylo.dat
  [1,16,0,0,0,10,0,0,0,7,0,0,0,10, ldraw_lib__4_4cylo()],
];
module ldraw_lib__s__98138s02(step=0, col=false, unit=2/5, alt=false, line=0.2, solid=!$preview)
    makepoly(ldraw_lib__s__98138s02(), step=step, col=col, unit=unit, alt=alt, line=line, solid=solid);
ldraw_lib__s__98138s02(line=0.2);
// file: ../p/4-4ring9.scad
use <../lib.scad>
function ldraw_lib__4_4ring9() = [
// 0 Ring  9 x 1.0
// 0 Name: 4-4ring9.dat
// 0 Author: John Riley [jriley]
// 0 !LDRAW_ORG Primitive UPDATE 2004-02
// 0 !LICENSE Licensed under CC BY 2.0 and CC BY 4.0 : see CAreadme.txt
// 
// 0 BFC CERTIFY CCW
  [0,"BFC","CERTIFY"],
  [0,"BFC","CCW"],
// 
// 0 !HISTORY 2004-04-22 [PTadmin] Official Update 2004-02
// 0 !HISTORY 2007-06-24 [PTadmin] Header formatted for Contributor Agreement
// 0 !HISTORY 2008-07-01 [PTadmin] Official Update 2008-01
// 
// 
// 4 16 9 0 0 10 0 0 9.239 0 3.827 8.3151 0 3.4443
  [4,16,9,0,0,10,0,0,9.239,0,3.827,8.3151,0,3.4443],
// 4 16 8.3151 0 3.4443 9.239 0 3.827 7.071 0 7.071 6.3639 0 6.3639
  [4,16,8.3151,0,3.4443,9.239,0,3.827,7.071,0,7.071,6.3639,0,6.3639],
// 4 16 6.3639 0 6.3639 7.071 0 7.071 3.827 0 9.239 3.4443 0 8.3151
  [4,16,6.3639,0,6.3639,7.071,0,7.071,3.827,0,9.239,3.4443,0,8.3151],
// 4 16 3.4443 0 8.3151 3.827 0 9.239 0 0 10 0 0 9
  [4,16,3.4443,0,8.3151,3.827,0,9.239,0,0,10,0,0,9],
// 4 16 0 0 9 0 0 10 -3.827 0 9.239 -3.4443 0 8.3151
  [4,16,0,0,9,0,0,10,-3.827,0,9.239,-3.4443,0,8.3151],
// 4 16 -3.4443 0 8.3151 -3.827 0 9.239 -7.071 0 7.071 -6.3639 0 6.3639
  [4,16,-3.4443,0,8.3151,-3.827,0,9.239,-7.071,0,7.071,-6.3639,0,6.3639],
// 4 16 -6.3639 0 6.3639 -7.071 0 7.071 -9.239 0 3.827 -8.3151 0 3.4443
  [4,16,-6.3639,0,6.3639,-7.071,0,7.071,-9.239,0,3.827,-8.3151,0,3.4443],
// 4 16 -8.3151 0 3.4443 -9.239 0 3.827 -10 0 0 -9 0 0
  [4,16,-8.3151,0,3.4443,-9.239,0,3.827,-10,0,0,-9,0,0],
// 4 16 -9 0 0 -10 0 0 -9.239 0 -3.827 -8.3151 0 -3.4443
  [4,16,-9,0,0,-10,0,0,-9.239,0,-3.827,-8.3151,0,-3.4443],
// 4 16 -8.3151 0 -3.4443 -9.239 0 -3.827 -7.071 0 -7.071 -6.3639 0 -6.3639
  [4,16,-8.3151,0,-3.4443,-9.239,0,-3.827,-7.071,0,-7.071,-6.3639,0,-6.3639],
// 4 16 -6.3639 0 -6.3639 -7.071 0 -7.071 -3.827 0 -9.239 -3.4443 0 -8.3151
  [4,16,-6.3639,0,-6.3639,-7.071,0,-7.071,-3.827,0,-9.239,-3.4443,0,-8.3151],
// 4 16 -3.4443 0 -8.3151 -3.827 0 -9.239 0 0 -10 0 0 -9
  [4,16,-3.4443,0,-8.3151,-3.827,0,-9.239,0,0,-10,0,0,-9],
// 4 16 0 0 -9 0 0 -10 3.827 0 -9.239 3.4443 0 -8.3151
  [4,16,0,0,-9,0,0,-10,3.827,0,-9.239,3.4443,0,-8.3151],
// 4 16 3.4443 0 -8.3151 3.827 0 -9.239 7.071 0 -7.071 6.3639 0 -6.3639
  [4,16,3.4443,0,-8.3151,3.827,0,-9.239,7.071,0,-7.071,6.3639,0,-6.3639],
// 4 16 6.3639 0 -6.3639 7.071 0 -7.071 9.239 0 -3.827 8.3151 0 -3.4443
  [4,16,6.3639,0,-6.3639,7.071,0,-7.071,9.239,0,-3.827,8.3151,0,-3.4443],
// 4 16 8.3151 0 -3.4443 9.239 0 -3.827 10 0 0 9 0 0
  [4,16,8.3151,0,-3.4443,9.239,0,-3.827,10,0,0,9,0,0],
// 0
];
module ldraw_lib__4_4ring9(step=0, col=false, unit=2/5, alt=false, line=0.2, solid=!$preview)
    makepoly(ldraw_lib__4_4ring9(), step=step, col=col, unit=unit, alt=alt, line=line, solid=solid);
ldraw_lib__4_4ring9(line=0.2);
// file: ../p/1-8chrd.scad
use <../lib.scad>
function ldraw_lib__1_8chrd() = [
// 0 Chord 0.125
// 0 Name: 1-8chrd.dat
// 0 Author: Andy Westrate [westrate]
// 0 !LDRAW_ORG Primitive UPDATE 2004-02
// 0 !LICENSE Licensed under CC BY 2.0 and CC BY 4.0 : see CAreadme.txt
// 
// 0 BFC CERTIFY CCW
  [0,"BFC","CERTIFY"],
  [0,"BFC","CCW"],
// 
// 0 !HISTORY 2004-04-22 [PTadmin] Official Update 2004-02
// 0 !HISTORY 2007-06-22 [PTadmin] Header formatted for Contributor Agreement
// 0 !HISTORY 2008-07-01 [PTadmin] Official Update 2008-01
// 
// 
// 3 16 0.7071 0 0.7071 1 0 0 0.9239 0 0.3827
  [3,16,0.7071,0,0.7071,1,0,0,0.9239,0,0.3827],
// 
// 0
];
module ldraw_lib__1_8chrd(step=0, col=false, unit=2/5, alt=false, line=0.2, solid=!$preview)
    makepoly(ldraw_lib__1_8chrd(), step=step, col=col, unit=unit, alt=alt, line=line, solid=solid);
ldraw_lib__1_8chrd(line=0.2);
// main file
use <../lib.scad>
use <../p/1-8chrd.scad>
use <../p/4-4ring9.scad>
use <s/98138s02.scad>
function ldraw_lib__98138p0w() = [
// 0 Tile  1 x  1 Round with Bright Light Yellow Emoji Sad Pattern
// 0 Name: 98138p0w.dat
// 0 Author: Philippe Hurbain [Philo]
// 0 !LDRAW_ORG Part UPDATE 2022-01
// 0 !LICENSE Licensed under CC BY 2.0 and CC BY 4.0 : see CAreadme.txt
// 
// 0 BFC CERTIFY CCW
  [0,"BFC","CERTIFY"],
  [0,"BFC","CCW"],
// 
// 0 !KEYWORDS Bricklink 98138pb137, Dots, Set 41908
// 
// 0 !HISTORY 2020-06-28 [PTadmin] Official Update 2020-01
// 0 !HISTORY 2022-01-14 [PTadmin] Official Update 2022-01
// 
// 
// 1 16 0 0 0 1 0 0 0 1 0 0 0 1 s\98138s02.dat
  [1,16,0,0,0,1,0,0,0,1,0,0,0,1, ldraw_lib__s__98138s02()],
// 1 16 0 0 0 1 0 0 0 1 0 0 0 1 4-4ring9.dat
  [1,16,0,0,0,1,0,0,0,1,0,0,0,1, ldraw_lib__4_4ring9()],
// 1 226 0 0 0 0 0 -9 0 1 0 9 0 0 1-8chrd.dat
  [1,226,0,0,0,0,0,-9,0,1,0,9,0,0, ldraw_lib__1_8chrd()],
// 1 226 0 0 0 -9 0 0 0 1 0 0 0 -9 1-8chrd.dat
  [1,226,0,0,0,-9,0,0,0,1,0,0,0,-9, ldraw_lib__1_8chrd()],
// 1 226 0 0 0 -9 0 0 0 1 0 0 0 9 1-8chrd.dat
  [1,226,0,0,0,-9,0,0,0,1,0,0,0,9, ldraw_lib__1_8chrd()],
// 1 226 0 0 0 0 0 -9 0 1 0 -9 0 0 1-8chrd.dat
  [1,226,0,0,0,0,0,-9,0,1,0,-9,0,0, ldraw_lib__1_8chrd()],
// 4 0 -2.782 0 0.675 -5.318 0 1.775 -5.422 0 1.25 -5.368 0 0.825
  [4,0,-2.782,0,0.675,-5.318,0,1.775,-5.422,0,1.25,-5.368,0,0.825],
// 4 0 -2.782 0 0.675 -2.678 0 1.25 -2.782 0 1.775 -3.08 0 2.22
  [4,0,-2.782,0,0.675,-2.678,0,1.25,-2.782,0,1.775,-3.08,0,2.22],
// 4 0 -2.782 0 0.675 -3.08 0 2.22 -3.525 0 2.518 -4.05 0 2.622
  [4,0,-2.782,0,0.675,-3.08,0,2.22,-3.525,0,2.518,-4.05,0,2.622],
// 4 0 -2.782 0 0.675 -4.05 0 2.622 -4.575 0 2.518 -5.02 0 2.22
  [4,0,-2.782,0,0.675,-4.05,0,2.622,-4.575,0,2.518,-5.02,0,2.22],
// 3 0 -5.02 0 2.22 -5.318 0 1.775 -2.782 0 0.675
  [3,0,-5.02,0,2.22,-5.318,0,1.775,-2.782,0,0.675],
// 4 0 5.218 0 0.775 2.682 0 1.875 2.578 0 1.35 2.632 0 0.925
  [4,0,5.218,0,0.775,2.682,0,1.875,2.578,0,1.35,2.632,0,0.925],
// 4 0 5.218 0 0.775 5.322 0 1.35 5.218 0 1.875 4.92 0 2.32
  [4,0,5.218,0,0.775,5.322,0,1.35,5.218,0,1.875,4.92,0,2.32],
// 4 0 5.218 0 0.775 4.92 0 2.32 3.95 0 2.722 3.425 0 2.618
  [4,0,5.218,0,0.775,4.92,0,2.32,3.95,0,2.722,3.425,0,2.618],
// 4 0 5.218 0 0.775 3.425 0 2.618 2.98 0 2.32 2.682 0 1.875
  [4,0,5.218,0,0.775,3.425,0,2.618,2.98,0,2.32,2.682,0,1.875],
// 4 0 3.45 0 3.3 3.95 0 2.722 3.9 0 3.8 2.75 0 4.35
  [4,0,3.45,0,3.3,3.95,0,2.722,3.9,0,3.8,2.75,0,4.35],
// 4 0 2.9 0 4.5 2.75 0 4.35 3.9 0 3.8 3.25 0 4.45
  [4,0,2.9,0,4.5,2.75,0,4.35,3.9,0,3.8,3.25,0,4.45],
// 4 0 3.9 0 3.8 3.95 0 2.722 4.92 0 2.32 5.05 0 2.95
  [4,0,3.9,0,3.8,3.95,0,2.722,4.92,0,2.32,5.05,0,2.95],
// 4 0 5.05 0 2.95 4.92 0 2.32 5.45 0 2.15 5.65 0 2.7
  [4,0,5.05,0,2.95,4.92,0,2.32,5.45,0,2.15,5.65,0,2.7],
// 4 0 6 0 2.5 5.65 0 2.7 5.45 0 2.15 5.8 0 2.1
  [4,0,6,0,2.5,5.65,0,2.7,5.45,0,2.15,5.8,0,2.1],
// 3 0 6 0 2.5 5.8 0 2.1 6.05 0 2.25
  [3,0,6,0,2.5,5.8,0,2.1,6.05,0,2.25],
// 4 0 -6.15 0 3.65 -6.25 0 3.5 -6.2 0 3.3 -5.85 0 3.15
  [4,0,-6.15,0,3.65,-6.25,0,3.5,-6.2,0,3.3,-5.85,0,3.15],
// 4 0 -6.15 0 3.65 -5.85 0 3.15 -5.2 0 3.35 -5.4 0 3.95
  [4,0,-6.15,0,3.65,-5.85,0,3.15,-5.2,0,3.35,-5.4,0,3.95],
// 4 0 -5.4 0 3.95 -5.2 0 3.35 -4.55 0 3.65 -4.75 0 4.4
  [4,0,-5.4,0,3.95,-5.2,0,3.35,-4.55,0,3.65,-4.75,0,4.4],
// 4 0 -4.75 0 4.4 -4.55 0 3.65 -3.9 0 4.15 -4.05 0 4.95
  [4,0,-4.75,0,4.4,-4.55,0,3.65,-3.9,0,4.15,-4.05,0,4.95],
// 4 0 -4.05 0 4.95 -3.9 0 4.15 -3.3 0 4.9 -3.45 0 5.65
  [4,0,-4.05,0,4.95,-3.9,0,4.15,-3.3,0,4.9,-3.45,0,5.65],
// 4 0 -3.25 0 5.6 -3.45 0 5.65 -3.3 0 4.9 -3.1 0 5.3
  [4,0,-3.25,0,5.6,-3.45,0,5.65,-3.3,0,4.9,-3.1,0,5.3],
// 4 0 -2.3 0 -1.45 -2.35 0 -1.7 -2.25 0 -1.9 -2.05 0 -2.05
  [4,0,-2.3,0,-1.45,-2.35,0,-1.7,-2.25,0,-1.9,-2.05,0,-2.05],
// 4 0 -2.3 0 -1.45 -2.05 0 -2.05 -1.8 0 -1.95 -1.75 0 -1.6
  [4,0,-2.3,0,-1.45,-2.05,0,-2.05,-1.8,0,-1.95,-1.75,0,-1.6],
// 4 0 -2 0 -0.95 -2.3 0 -1.45 -1.75 0 -1.6 -1.45 0 -1.2
  [4,0,-2,0,-0.95,-2.3,0,-1.45,-1.75,0,-1.6,-1.45,0,-1.2],
// 4 0 -1.4 0 -0.45 -2 0 -0.95 -1.45 0 -1.2 -1 0 -0.85
  [4,0,-1.4,0,-0.45,-2,0,-0.95,-1.45,0,-1.2,-1,0,-0.85],
// 4 0 -0.9 0 -0.2 -1.4 0 -0.45 -1 0 -0.85 -0.4 0 -0.65
  [4,0,-0.9,0,-0.2,-1.4,0,-0.45,-1,0,-0.85,-0.4,0,-0.65],
// 4 0 -0.2 0 -0.05 -0.9 0 -0.2 -0.4 0 -0.65 0.2 0 -0.55
  [4,0,-0.2,0,-0.05,-0.9,0,-0.2,-0.4,0,-0.65,0.2,0,-0.55],
// 4 0 0.45 0 -0.05 -0.2 0 -0.05 0.2 0 -0.55 0.9 0 -0.6
  [4,0,0.45,0,-0.05,-0.2,0,-0.05,0.2,0,-0.55,0.9,0,-0.6],
// 4 0 1.2 0 -0.1 0.45 0 -0.05 0.9 0 -0.6 1.5 0 -0.8
  [4,0,1.2,0,-0.1,0.45,0,-0.05,0.9,0,-0.6,1.5,0,-0.8],
// 4 0 1.85 0 -0.4 1.2 0 -0.1 1.5 0 -0.8 1.8 0 -1.15
  [4,0,1.85,0,-0.4,1.2,0,-0.1,1.5,0,-0.8,1.8,0,-1.15],
// 4 0 2.2 0 -0.8 1.85 0 -0.4 1.8 0 -1.15 1.95 0 -1.35
  [4,0,2.2,0,-0.8,1.85,0,-0.4,1.8,0,-1.15,1.95,0,-1.35],
// 4 0 2.2 0 -0.8 1.95 0 -1.35 2.15 0 -1.4 2.3 0 -1.05
  [4,0,2.2,0,-0.8,1.95,0,-1.35,2.15,0,-1.4,2.3,0,-1.05],
// 3 0 2.3 0 -1.05 2.15 0 -1.4 2.3 0 -1.25
  [3,0,2.3,0,-1.05,2.15,0,-1.4,2.3,0,-1.25],
// 4 226 -6.364 0 6.364 -6.15 0 3.65 -5.4 0 3.95 -4.75 0 4.4
  [4,226,-6.364,0,6.364,-6.15,0,3.65,-5.4,0,3.95,-4.75,0,4.4],
// 4 226 -6.364 0 6.364 -4.75 0 4.4 -4.05 0 4.95 -3.45 0 5.65
  [4,226,-6.364,0,6.364,-4.75,0,4.4,-4.05,0,4.95,-3.45,0,5.65],
// 3 226 0 0 9 -6.364 0 6.364 -3.45 0 5.65
  [3,226,0,0,9,-6.364,0,6.364,-3.45,0,5.65],
// 4 226 0 0 9 -3.45 0 5.65 -3.25 0 5.6 6.364 0 6.364
  [4,226,0,0,9,-3.45,0,5.65,-3.25,0,5.6,6.364,0,6.364],
// 4 226 6.364 0 6.364 -3.25 0 5.6 2.9 0 4.5 3.25 0 4.45
  [4,226,6.364,0,6.364,-3.25,0,5.6,2.9,0,4.5,3.25,0,4.45],
// 3 226 2.9 0 4.5 -3.25 0 5.6 2.75 0 4.35
  [3,226,2.9,0,4.5,-3.25,0,5.6,2.75,0,4.35],
// 4 226 2.75 0 4.35 -3.25 0 5.6 -3.1 0 5.3 3.45 0 3.3
  [4,226,2.75,0,4.35,-3.25,0,5.6,-3.1,0,5.3,3.45,0,3.3],
// 4 226 3.425 0 2.618 3.95 0 2.722 3.45 0 3.3 -3.1 0 5.3
  [4,226,3.425,0,2.618,3.95,0,2.722,3.45,0,3.3,-3.1,0,5.3],
// 4 226 2.98 0 2.32 3.425 0 2.618 -3.1 0 5.3 -3.3 0 4.9
  [4,226,2.98,0,2.32,3.425,0,2.618,-3.1,0,5.3,-3.3,0,4.9],
// 4 226 2.98 0 2.32 -3.3 0 4.9 -3.9 0 4.15 -3.08 0 2.22
  [4,226,2.98,0,2.32,-3.3,0,4.9,-3.9,0,4.15,-3.08,0,2.22],
// 4 226 2.98 0 2.32 -3.08 0 2.22 -2.782 0 1.775 2.682 0 1.875
  [4,226,2.98,0,2.32,-3.08,0,2.22,-2.782,0,1.775,2.682,0,1.875],
// 4 226 2.682 0 1.875 -2.782 0 1.775 -2.678 0 1.25 2.578 0 1.35
  [4,226,2.682,0,1.875,-2.782,0,1.775,-2.678,0,1.25,2.578,0,1.35],
// 4 226 2.578 0 1.35 -2.678 0 1.25 -2.782 0 0.675 2.632 0 0.925
  [4,226,2.578,0,1.35,-2.678,0,1.25,-2.782,0,0.675,2.632,0,0.925],
// 4 226 2.632 0 0.925 -2.782 0 0.675 -0.2 0 -0.05 0.45 0 -0.05
  [4,226,2.632,0,0.925,-2.782,0,0.675,-0.2,0,-0.05,0.45,0,-0.05],
// 3 226 2.632 0 0.925 0.45 0 -0.05 1.2 0 -0.1
  [3,226,2.632,0,0.925,0.45,0,-0.05,1.2,0,-0.1],
// 4 226 2.632 0 0.925 1.2 0 -0.1 1.85 0 -0.4 5.218 0 0.775
  [4,226,2.632,0,0.925,1.2,0,-0.1,1.85,0,-0.4,5.218,0,0.775],
// 3 226 5.218 0 0.775 1.85 0 -0.4 2.2 0 -0.8
  [3,226,5.218,0,0.775,1.85,0,-0.4,2.2,0,-0.8],
// 4 226 5.218 0 0.775 2.2 0 -0.8 2.3 0 -1.05 9 0 0
  [4,226,5.218,0,0.775,2.2,0,-0.8,2.3,0,-1.05,9,0,0],
// 4 226 5.322 0 1.35 5.218 0 0.775 9 0 0 5.8 0 2.1
  [4,226,5.322,0,1.35,5.218,0,0.775,9,0,0,5.8,0,2.1],
// 3 226 6.05 0 2.25 5.8 0 2.1 9 0 0
  [3,226,6.05,0,2.25,5.8,0,2.1,9,0,0],
// 4 226 6 0 2.5 6.05 0 2.25 9 0 0 6.364 0 6.364
  [4,226,6,0,2.5,6.05,0,2.25,9,0,0,6.364,0,6.364],
// 3 226 6.364 0 6.364 5.65 0 2.7 6 0 2.5
  [3,226,6.364,0,6.364,5.65,0,2.7,6,0,2.5],
// 4 226 5.05 0 2.95 5.65 0 2.7 6.364 0 6.364 3.9 0 3.8
  [4,226,5.05,0,2.95,5.65,0,2.7,6.364,0,6.364,3.9,0,3.8],
// 3 226 3.25 0 4.45 3.9 0 3.8 6.364 0 6.364
  [3,226,3.25,0,4.45,3.9,0,3.8,6.364,0,6.364],
// 3 226 4.92 0 2.32 5.218 0 1.875 5.45 0 2.15
  [3,226,4.92,0,2.32,5.218,0,1.875,5.45,0,2.15],
// 4 226 5.8 0 2.1 5.45 0 2.15 5.218 0 1.875 5.322 0 1.35
  [4,226,5.8,0,2.1,5.45,0,2.15,5.218,0,1.875,5.322,0,1.35],
// 4 226 6.364 0 -6.364 9 0 0 2.3 0 -1.05 2.3 0 -1.25
  [4,226,6.364,0,-6.364,9,0,0,2.3,0,-1.05,2.3,0,-1.25],
// 3 226 6.364 0 -6.364 2.3 0 -1.25 2.15 0 -1.4
  [3,226,6.364,0,-6.364,2.3,0,-1.25,2.15,0,-1.4],
// 4 226 0 0 -9 6.364 0 -6.364 2.15 0 -1.4 1.95 0 -1.35
  [4,226,0,0,-9,6.364,0,-6.364,2.15,0,-1.4,1.95,0,-1.35],
// 3 226 0 0 -9 1.95 0 -1.35 -1.8 0 -1.95
  [3,226,0,0,-9,1.95,0,-1.35,-1.8,0,-1.95],
// 4 226 -1.75 0 -1.6 -1.8 0 -1.95 1.95 0 -1.35 1.8 0 -1.15
  [4,226,-1.75,0,-1.6,-1.8,0,-1.95,1.95,0,-1.35,1.8,0,-1.15],
// 4 226 -1.75 0 -1.6 1.8 0 -1.15 1.5 0 -0.8 -1.45 0 -1.2
  [4,226,-1.75,0,-1.6,1.8,0,-1.15,1.5,0,-0.8,-1.45,0,-1.2],
// 4 226 -1 0 -0.85 -1.45 0 -1.2 1.5 0 -0.8 -0.4 0 -0.65
  [4,226,-1,0,-0.85,-1.45,0,-1.2,1.5,0,-0.8,-0.4,0,-0.65],
// 4 226 0.2 0 -0.55 -0.4 0 -0.65 1.5 0 -0.8 0.9 0 -0.6
  [4,226,0.2,0,-0.55,-0.4,0,-0.65,1.5,0,-0.8,0.9,0,-0.6],
// 4 226 0 0 -9 -1.8 0 -1.95 -2.05 0 -2.05 -6.364 0 -6.364
  [4,226,0,0,-9,-1.8,0,-1.95,-2.05,0,-2.05,-6.364,0,-6.364],
// 3 226 -2.25 0 -1.9 -6.364 0 -6.364 -2.05 0 -2.05
  [3,226,-2.25,0,-1.9,-6.364,0,-6.364,-2.05,0,-2.05],
// 4 226 -6.364 0 -6.364 -2.25 0 -1.9 -2.35 0 -1.7 -5.368 0 0.825
  [4,226,-6.364,0,-6.364,-2.25,0,-1.9,-2.35,0,-1.7,-5.368,0,0.825],
// 4 226 -5.368 0 0.825 -2.35 0 -1.7 -2.3 0 -1.45 -2.782 0 0.675
  [4,226,-5.368,0,0.825,-2.35,0,-1.7,-2.3,0,-1.45,-2.782,0,0.675],
// 3 226 -2.782 0 0.675 -2.3 0 -1.45 -2 0 -0.95
  [3,226,-2.782,0,0.675,-2.3,0,-1.45,-2,0,-0.95],
// 3 226 -2.782 0 0.675 -2 0 -0.95 -1.4 0 -0.45
  [3,226,-2.782,0,0.675,-2,0,-0.95,-1.4,0,-0.45],
// 3 226 -2.782 0 0.675 -1.4 0 -0.45 -0.9 0 -0.2
  [3,226,-2.782,0,0.675,-1.4,0,-0.45,-0.9,0,-0.2],
// 3 226 -2.782 0 0.675 -0.9 0 -0.2 -0.2 0 -0.05
  [3,226,-2.782,0,0.675,-0.9,0,-0.2,-0.2,0,-0.05],
// 4 226 -9 0 0 -6.364 0 -6.364 -5.368 0 0.825 -5.422 0 1.25
  [4,226,-9,0,0,-6.364,0,-6.364,-5.368,0,0.825,-5.422,0,1.25],
// 4 226 -5.85 0 3.15 -9 0 0 -5.422 0 1.25 -5.318 0 1.775
  [4,226,-5.85,0,3.15,-9,0,0,-5.422,0,1.25,-5.318,0,1.775],
// 4 226 -5.2 0 3.35 -5.85 0 3.15 -5.318 0 1.775 -5.02 0 2.22
  [4,226,-5.2,0,3.35,-5.85,0,3.15,-5.318,0,1.775,-5.02,0,2.22],
// 4 226 -4.55 0 3.65 -5.2 0 3.35 -5.02 0 2.22 -4.575 0 2.518
  [4,226,-4.55,0,3.65,-5.2,0,3.35,-5.02,0,2.22,-4.575,0,2.518],
// 4 226 -3.9 0 4.15 -4.55 0 3.65 -4.575 0 2.518 -4.05 0 2.622
  [4,226,-3.9,0,4.15,-4.55,0,3.65,-4.575,0,2.518,-4.05,0,2.622],
// 3 226 -3.9 0 4.15 -4.05 0 2.622 -3.525 0 2.518
  [3,226,-3.9,0,4.15,-4.05,0,2.622,-3.525,0,2.518],
// 3 226 -3.9 0 4.15 -3.525 0 2.518 -3.08 0 2.22
  [3,226,-3.9,0,4.15,-3.525,0,2.518,-3.08,0,2.22],
// 3 226 -6.25 0 3.5 -9 0 0 -6.2 0 3.3
  [3,226,-6.25,0,3.5,-9,0,0,-6.2,0,3.3],
// 3 226 -6.2 0 3.3 -9 0 0 -5.85 0 3.15
  [3,226,-6.2,0,3.3,-9,0,0,-5.85,0,3.15],
// 4 226 -6.364 0 6.364 -9 0 0 -6.25 0 3.5 -6.15 0 3.65
  [4,226,-6.364,0,6.364,-9,0,0,-6.25,0,3.5,-6.15,0,3.65],
// 1 226 0 0 0 0 0 9 0 1 0 9 0 0 1-8chrd.dat
  [1,226,0,0,0,0,0,9,0,1,0,9,0,0, ldraw_lib__1_8chrd()],
// 1 226 0 0 0 9 0 0 0 1 0 0 0 -9 1-8chrd.dat
  [1,226,0,0,0,9,0,0,0,1,0,0,0,-9, ldraw_lib__1_8chrd()],
// 1 226 0 0 0 9 0 0 0 1 0 0 0 9 1-8chrd.dat
  [1,226,0,0,0,9,0,0,0,1,0,0,0,9, ldraw_lib__1_8chrd()],
// 1 226 0 0 0 0 0 9 0 1 0 -9 0 0 1-8chrd.dat
  [1,226,0,0,0,0,0,9,0,1,0,-9,0,0, ldraw_lib__1_8chrd()],
];
module ldraw_lib__98138p0w(step=0, col=false, unit=2/5, alt=false, line=0.2, solid=!$preview)
    makepoly(ldraw_lib__98138p0w(), step=step, col=col, unit=unit, alt=alt, line=line, solid=solid);
ldraw_lib__98138p0w(line=0.2);
